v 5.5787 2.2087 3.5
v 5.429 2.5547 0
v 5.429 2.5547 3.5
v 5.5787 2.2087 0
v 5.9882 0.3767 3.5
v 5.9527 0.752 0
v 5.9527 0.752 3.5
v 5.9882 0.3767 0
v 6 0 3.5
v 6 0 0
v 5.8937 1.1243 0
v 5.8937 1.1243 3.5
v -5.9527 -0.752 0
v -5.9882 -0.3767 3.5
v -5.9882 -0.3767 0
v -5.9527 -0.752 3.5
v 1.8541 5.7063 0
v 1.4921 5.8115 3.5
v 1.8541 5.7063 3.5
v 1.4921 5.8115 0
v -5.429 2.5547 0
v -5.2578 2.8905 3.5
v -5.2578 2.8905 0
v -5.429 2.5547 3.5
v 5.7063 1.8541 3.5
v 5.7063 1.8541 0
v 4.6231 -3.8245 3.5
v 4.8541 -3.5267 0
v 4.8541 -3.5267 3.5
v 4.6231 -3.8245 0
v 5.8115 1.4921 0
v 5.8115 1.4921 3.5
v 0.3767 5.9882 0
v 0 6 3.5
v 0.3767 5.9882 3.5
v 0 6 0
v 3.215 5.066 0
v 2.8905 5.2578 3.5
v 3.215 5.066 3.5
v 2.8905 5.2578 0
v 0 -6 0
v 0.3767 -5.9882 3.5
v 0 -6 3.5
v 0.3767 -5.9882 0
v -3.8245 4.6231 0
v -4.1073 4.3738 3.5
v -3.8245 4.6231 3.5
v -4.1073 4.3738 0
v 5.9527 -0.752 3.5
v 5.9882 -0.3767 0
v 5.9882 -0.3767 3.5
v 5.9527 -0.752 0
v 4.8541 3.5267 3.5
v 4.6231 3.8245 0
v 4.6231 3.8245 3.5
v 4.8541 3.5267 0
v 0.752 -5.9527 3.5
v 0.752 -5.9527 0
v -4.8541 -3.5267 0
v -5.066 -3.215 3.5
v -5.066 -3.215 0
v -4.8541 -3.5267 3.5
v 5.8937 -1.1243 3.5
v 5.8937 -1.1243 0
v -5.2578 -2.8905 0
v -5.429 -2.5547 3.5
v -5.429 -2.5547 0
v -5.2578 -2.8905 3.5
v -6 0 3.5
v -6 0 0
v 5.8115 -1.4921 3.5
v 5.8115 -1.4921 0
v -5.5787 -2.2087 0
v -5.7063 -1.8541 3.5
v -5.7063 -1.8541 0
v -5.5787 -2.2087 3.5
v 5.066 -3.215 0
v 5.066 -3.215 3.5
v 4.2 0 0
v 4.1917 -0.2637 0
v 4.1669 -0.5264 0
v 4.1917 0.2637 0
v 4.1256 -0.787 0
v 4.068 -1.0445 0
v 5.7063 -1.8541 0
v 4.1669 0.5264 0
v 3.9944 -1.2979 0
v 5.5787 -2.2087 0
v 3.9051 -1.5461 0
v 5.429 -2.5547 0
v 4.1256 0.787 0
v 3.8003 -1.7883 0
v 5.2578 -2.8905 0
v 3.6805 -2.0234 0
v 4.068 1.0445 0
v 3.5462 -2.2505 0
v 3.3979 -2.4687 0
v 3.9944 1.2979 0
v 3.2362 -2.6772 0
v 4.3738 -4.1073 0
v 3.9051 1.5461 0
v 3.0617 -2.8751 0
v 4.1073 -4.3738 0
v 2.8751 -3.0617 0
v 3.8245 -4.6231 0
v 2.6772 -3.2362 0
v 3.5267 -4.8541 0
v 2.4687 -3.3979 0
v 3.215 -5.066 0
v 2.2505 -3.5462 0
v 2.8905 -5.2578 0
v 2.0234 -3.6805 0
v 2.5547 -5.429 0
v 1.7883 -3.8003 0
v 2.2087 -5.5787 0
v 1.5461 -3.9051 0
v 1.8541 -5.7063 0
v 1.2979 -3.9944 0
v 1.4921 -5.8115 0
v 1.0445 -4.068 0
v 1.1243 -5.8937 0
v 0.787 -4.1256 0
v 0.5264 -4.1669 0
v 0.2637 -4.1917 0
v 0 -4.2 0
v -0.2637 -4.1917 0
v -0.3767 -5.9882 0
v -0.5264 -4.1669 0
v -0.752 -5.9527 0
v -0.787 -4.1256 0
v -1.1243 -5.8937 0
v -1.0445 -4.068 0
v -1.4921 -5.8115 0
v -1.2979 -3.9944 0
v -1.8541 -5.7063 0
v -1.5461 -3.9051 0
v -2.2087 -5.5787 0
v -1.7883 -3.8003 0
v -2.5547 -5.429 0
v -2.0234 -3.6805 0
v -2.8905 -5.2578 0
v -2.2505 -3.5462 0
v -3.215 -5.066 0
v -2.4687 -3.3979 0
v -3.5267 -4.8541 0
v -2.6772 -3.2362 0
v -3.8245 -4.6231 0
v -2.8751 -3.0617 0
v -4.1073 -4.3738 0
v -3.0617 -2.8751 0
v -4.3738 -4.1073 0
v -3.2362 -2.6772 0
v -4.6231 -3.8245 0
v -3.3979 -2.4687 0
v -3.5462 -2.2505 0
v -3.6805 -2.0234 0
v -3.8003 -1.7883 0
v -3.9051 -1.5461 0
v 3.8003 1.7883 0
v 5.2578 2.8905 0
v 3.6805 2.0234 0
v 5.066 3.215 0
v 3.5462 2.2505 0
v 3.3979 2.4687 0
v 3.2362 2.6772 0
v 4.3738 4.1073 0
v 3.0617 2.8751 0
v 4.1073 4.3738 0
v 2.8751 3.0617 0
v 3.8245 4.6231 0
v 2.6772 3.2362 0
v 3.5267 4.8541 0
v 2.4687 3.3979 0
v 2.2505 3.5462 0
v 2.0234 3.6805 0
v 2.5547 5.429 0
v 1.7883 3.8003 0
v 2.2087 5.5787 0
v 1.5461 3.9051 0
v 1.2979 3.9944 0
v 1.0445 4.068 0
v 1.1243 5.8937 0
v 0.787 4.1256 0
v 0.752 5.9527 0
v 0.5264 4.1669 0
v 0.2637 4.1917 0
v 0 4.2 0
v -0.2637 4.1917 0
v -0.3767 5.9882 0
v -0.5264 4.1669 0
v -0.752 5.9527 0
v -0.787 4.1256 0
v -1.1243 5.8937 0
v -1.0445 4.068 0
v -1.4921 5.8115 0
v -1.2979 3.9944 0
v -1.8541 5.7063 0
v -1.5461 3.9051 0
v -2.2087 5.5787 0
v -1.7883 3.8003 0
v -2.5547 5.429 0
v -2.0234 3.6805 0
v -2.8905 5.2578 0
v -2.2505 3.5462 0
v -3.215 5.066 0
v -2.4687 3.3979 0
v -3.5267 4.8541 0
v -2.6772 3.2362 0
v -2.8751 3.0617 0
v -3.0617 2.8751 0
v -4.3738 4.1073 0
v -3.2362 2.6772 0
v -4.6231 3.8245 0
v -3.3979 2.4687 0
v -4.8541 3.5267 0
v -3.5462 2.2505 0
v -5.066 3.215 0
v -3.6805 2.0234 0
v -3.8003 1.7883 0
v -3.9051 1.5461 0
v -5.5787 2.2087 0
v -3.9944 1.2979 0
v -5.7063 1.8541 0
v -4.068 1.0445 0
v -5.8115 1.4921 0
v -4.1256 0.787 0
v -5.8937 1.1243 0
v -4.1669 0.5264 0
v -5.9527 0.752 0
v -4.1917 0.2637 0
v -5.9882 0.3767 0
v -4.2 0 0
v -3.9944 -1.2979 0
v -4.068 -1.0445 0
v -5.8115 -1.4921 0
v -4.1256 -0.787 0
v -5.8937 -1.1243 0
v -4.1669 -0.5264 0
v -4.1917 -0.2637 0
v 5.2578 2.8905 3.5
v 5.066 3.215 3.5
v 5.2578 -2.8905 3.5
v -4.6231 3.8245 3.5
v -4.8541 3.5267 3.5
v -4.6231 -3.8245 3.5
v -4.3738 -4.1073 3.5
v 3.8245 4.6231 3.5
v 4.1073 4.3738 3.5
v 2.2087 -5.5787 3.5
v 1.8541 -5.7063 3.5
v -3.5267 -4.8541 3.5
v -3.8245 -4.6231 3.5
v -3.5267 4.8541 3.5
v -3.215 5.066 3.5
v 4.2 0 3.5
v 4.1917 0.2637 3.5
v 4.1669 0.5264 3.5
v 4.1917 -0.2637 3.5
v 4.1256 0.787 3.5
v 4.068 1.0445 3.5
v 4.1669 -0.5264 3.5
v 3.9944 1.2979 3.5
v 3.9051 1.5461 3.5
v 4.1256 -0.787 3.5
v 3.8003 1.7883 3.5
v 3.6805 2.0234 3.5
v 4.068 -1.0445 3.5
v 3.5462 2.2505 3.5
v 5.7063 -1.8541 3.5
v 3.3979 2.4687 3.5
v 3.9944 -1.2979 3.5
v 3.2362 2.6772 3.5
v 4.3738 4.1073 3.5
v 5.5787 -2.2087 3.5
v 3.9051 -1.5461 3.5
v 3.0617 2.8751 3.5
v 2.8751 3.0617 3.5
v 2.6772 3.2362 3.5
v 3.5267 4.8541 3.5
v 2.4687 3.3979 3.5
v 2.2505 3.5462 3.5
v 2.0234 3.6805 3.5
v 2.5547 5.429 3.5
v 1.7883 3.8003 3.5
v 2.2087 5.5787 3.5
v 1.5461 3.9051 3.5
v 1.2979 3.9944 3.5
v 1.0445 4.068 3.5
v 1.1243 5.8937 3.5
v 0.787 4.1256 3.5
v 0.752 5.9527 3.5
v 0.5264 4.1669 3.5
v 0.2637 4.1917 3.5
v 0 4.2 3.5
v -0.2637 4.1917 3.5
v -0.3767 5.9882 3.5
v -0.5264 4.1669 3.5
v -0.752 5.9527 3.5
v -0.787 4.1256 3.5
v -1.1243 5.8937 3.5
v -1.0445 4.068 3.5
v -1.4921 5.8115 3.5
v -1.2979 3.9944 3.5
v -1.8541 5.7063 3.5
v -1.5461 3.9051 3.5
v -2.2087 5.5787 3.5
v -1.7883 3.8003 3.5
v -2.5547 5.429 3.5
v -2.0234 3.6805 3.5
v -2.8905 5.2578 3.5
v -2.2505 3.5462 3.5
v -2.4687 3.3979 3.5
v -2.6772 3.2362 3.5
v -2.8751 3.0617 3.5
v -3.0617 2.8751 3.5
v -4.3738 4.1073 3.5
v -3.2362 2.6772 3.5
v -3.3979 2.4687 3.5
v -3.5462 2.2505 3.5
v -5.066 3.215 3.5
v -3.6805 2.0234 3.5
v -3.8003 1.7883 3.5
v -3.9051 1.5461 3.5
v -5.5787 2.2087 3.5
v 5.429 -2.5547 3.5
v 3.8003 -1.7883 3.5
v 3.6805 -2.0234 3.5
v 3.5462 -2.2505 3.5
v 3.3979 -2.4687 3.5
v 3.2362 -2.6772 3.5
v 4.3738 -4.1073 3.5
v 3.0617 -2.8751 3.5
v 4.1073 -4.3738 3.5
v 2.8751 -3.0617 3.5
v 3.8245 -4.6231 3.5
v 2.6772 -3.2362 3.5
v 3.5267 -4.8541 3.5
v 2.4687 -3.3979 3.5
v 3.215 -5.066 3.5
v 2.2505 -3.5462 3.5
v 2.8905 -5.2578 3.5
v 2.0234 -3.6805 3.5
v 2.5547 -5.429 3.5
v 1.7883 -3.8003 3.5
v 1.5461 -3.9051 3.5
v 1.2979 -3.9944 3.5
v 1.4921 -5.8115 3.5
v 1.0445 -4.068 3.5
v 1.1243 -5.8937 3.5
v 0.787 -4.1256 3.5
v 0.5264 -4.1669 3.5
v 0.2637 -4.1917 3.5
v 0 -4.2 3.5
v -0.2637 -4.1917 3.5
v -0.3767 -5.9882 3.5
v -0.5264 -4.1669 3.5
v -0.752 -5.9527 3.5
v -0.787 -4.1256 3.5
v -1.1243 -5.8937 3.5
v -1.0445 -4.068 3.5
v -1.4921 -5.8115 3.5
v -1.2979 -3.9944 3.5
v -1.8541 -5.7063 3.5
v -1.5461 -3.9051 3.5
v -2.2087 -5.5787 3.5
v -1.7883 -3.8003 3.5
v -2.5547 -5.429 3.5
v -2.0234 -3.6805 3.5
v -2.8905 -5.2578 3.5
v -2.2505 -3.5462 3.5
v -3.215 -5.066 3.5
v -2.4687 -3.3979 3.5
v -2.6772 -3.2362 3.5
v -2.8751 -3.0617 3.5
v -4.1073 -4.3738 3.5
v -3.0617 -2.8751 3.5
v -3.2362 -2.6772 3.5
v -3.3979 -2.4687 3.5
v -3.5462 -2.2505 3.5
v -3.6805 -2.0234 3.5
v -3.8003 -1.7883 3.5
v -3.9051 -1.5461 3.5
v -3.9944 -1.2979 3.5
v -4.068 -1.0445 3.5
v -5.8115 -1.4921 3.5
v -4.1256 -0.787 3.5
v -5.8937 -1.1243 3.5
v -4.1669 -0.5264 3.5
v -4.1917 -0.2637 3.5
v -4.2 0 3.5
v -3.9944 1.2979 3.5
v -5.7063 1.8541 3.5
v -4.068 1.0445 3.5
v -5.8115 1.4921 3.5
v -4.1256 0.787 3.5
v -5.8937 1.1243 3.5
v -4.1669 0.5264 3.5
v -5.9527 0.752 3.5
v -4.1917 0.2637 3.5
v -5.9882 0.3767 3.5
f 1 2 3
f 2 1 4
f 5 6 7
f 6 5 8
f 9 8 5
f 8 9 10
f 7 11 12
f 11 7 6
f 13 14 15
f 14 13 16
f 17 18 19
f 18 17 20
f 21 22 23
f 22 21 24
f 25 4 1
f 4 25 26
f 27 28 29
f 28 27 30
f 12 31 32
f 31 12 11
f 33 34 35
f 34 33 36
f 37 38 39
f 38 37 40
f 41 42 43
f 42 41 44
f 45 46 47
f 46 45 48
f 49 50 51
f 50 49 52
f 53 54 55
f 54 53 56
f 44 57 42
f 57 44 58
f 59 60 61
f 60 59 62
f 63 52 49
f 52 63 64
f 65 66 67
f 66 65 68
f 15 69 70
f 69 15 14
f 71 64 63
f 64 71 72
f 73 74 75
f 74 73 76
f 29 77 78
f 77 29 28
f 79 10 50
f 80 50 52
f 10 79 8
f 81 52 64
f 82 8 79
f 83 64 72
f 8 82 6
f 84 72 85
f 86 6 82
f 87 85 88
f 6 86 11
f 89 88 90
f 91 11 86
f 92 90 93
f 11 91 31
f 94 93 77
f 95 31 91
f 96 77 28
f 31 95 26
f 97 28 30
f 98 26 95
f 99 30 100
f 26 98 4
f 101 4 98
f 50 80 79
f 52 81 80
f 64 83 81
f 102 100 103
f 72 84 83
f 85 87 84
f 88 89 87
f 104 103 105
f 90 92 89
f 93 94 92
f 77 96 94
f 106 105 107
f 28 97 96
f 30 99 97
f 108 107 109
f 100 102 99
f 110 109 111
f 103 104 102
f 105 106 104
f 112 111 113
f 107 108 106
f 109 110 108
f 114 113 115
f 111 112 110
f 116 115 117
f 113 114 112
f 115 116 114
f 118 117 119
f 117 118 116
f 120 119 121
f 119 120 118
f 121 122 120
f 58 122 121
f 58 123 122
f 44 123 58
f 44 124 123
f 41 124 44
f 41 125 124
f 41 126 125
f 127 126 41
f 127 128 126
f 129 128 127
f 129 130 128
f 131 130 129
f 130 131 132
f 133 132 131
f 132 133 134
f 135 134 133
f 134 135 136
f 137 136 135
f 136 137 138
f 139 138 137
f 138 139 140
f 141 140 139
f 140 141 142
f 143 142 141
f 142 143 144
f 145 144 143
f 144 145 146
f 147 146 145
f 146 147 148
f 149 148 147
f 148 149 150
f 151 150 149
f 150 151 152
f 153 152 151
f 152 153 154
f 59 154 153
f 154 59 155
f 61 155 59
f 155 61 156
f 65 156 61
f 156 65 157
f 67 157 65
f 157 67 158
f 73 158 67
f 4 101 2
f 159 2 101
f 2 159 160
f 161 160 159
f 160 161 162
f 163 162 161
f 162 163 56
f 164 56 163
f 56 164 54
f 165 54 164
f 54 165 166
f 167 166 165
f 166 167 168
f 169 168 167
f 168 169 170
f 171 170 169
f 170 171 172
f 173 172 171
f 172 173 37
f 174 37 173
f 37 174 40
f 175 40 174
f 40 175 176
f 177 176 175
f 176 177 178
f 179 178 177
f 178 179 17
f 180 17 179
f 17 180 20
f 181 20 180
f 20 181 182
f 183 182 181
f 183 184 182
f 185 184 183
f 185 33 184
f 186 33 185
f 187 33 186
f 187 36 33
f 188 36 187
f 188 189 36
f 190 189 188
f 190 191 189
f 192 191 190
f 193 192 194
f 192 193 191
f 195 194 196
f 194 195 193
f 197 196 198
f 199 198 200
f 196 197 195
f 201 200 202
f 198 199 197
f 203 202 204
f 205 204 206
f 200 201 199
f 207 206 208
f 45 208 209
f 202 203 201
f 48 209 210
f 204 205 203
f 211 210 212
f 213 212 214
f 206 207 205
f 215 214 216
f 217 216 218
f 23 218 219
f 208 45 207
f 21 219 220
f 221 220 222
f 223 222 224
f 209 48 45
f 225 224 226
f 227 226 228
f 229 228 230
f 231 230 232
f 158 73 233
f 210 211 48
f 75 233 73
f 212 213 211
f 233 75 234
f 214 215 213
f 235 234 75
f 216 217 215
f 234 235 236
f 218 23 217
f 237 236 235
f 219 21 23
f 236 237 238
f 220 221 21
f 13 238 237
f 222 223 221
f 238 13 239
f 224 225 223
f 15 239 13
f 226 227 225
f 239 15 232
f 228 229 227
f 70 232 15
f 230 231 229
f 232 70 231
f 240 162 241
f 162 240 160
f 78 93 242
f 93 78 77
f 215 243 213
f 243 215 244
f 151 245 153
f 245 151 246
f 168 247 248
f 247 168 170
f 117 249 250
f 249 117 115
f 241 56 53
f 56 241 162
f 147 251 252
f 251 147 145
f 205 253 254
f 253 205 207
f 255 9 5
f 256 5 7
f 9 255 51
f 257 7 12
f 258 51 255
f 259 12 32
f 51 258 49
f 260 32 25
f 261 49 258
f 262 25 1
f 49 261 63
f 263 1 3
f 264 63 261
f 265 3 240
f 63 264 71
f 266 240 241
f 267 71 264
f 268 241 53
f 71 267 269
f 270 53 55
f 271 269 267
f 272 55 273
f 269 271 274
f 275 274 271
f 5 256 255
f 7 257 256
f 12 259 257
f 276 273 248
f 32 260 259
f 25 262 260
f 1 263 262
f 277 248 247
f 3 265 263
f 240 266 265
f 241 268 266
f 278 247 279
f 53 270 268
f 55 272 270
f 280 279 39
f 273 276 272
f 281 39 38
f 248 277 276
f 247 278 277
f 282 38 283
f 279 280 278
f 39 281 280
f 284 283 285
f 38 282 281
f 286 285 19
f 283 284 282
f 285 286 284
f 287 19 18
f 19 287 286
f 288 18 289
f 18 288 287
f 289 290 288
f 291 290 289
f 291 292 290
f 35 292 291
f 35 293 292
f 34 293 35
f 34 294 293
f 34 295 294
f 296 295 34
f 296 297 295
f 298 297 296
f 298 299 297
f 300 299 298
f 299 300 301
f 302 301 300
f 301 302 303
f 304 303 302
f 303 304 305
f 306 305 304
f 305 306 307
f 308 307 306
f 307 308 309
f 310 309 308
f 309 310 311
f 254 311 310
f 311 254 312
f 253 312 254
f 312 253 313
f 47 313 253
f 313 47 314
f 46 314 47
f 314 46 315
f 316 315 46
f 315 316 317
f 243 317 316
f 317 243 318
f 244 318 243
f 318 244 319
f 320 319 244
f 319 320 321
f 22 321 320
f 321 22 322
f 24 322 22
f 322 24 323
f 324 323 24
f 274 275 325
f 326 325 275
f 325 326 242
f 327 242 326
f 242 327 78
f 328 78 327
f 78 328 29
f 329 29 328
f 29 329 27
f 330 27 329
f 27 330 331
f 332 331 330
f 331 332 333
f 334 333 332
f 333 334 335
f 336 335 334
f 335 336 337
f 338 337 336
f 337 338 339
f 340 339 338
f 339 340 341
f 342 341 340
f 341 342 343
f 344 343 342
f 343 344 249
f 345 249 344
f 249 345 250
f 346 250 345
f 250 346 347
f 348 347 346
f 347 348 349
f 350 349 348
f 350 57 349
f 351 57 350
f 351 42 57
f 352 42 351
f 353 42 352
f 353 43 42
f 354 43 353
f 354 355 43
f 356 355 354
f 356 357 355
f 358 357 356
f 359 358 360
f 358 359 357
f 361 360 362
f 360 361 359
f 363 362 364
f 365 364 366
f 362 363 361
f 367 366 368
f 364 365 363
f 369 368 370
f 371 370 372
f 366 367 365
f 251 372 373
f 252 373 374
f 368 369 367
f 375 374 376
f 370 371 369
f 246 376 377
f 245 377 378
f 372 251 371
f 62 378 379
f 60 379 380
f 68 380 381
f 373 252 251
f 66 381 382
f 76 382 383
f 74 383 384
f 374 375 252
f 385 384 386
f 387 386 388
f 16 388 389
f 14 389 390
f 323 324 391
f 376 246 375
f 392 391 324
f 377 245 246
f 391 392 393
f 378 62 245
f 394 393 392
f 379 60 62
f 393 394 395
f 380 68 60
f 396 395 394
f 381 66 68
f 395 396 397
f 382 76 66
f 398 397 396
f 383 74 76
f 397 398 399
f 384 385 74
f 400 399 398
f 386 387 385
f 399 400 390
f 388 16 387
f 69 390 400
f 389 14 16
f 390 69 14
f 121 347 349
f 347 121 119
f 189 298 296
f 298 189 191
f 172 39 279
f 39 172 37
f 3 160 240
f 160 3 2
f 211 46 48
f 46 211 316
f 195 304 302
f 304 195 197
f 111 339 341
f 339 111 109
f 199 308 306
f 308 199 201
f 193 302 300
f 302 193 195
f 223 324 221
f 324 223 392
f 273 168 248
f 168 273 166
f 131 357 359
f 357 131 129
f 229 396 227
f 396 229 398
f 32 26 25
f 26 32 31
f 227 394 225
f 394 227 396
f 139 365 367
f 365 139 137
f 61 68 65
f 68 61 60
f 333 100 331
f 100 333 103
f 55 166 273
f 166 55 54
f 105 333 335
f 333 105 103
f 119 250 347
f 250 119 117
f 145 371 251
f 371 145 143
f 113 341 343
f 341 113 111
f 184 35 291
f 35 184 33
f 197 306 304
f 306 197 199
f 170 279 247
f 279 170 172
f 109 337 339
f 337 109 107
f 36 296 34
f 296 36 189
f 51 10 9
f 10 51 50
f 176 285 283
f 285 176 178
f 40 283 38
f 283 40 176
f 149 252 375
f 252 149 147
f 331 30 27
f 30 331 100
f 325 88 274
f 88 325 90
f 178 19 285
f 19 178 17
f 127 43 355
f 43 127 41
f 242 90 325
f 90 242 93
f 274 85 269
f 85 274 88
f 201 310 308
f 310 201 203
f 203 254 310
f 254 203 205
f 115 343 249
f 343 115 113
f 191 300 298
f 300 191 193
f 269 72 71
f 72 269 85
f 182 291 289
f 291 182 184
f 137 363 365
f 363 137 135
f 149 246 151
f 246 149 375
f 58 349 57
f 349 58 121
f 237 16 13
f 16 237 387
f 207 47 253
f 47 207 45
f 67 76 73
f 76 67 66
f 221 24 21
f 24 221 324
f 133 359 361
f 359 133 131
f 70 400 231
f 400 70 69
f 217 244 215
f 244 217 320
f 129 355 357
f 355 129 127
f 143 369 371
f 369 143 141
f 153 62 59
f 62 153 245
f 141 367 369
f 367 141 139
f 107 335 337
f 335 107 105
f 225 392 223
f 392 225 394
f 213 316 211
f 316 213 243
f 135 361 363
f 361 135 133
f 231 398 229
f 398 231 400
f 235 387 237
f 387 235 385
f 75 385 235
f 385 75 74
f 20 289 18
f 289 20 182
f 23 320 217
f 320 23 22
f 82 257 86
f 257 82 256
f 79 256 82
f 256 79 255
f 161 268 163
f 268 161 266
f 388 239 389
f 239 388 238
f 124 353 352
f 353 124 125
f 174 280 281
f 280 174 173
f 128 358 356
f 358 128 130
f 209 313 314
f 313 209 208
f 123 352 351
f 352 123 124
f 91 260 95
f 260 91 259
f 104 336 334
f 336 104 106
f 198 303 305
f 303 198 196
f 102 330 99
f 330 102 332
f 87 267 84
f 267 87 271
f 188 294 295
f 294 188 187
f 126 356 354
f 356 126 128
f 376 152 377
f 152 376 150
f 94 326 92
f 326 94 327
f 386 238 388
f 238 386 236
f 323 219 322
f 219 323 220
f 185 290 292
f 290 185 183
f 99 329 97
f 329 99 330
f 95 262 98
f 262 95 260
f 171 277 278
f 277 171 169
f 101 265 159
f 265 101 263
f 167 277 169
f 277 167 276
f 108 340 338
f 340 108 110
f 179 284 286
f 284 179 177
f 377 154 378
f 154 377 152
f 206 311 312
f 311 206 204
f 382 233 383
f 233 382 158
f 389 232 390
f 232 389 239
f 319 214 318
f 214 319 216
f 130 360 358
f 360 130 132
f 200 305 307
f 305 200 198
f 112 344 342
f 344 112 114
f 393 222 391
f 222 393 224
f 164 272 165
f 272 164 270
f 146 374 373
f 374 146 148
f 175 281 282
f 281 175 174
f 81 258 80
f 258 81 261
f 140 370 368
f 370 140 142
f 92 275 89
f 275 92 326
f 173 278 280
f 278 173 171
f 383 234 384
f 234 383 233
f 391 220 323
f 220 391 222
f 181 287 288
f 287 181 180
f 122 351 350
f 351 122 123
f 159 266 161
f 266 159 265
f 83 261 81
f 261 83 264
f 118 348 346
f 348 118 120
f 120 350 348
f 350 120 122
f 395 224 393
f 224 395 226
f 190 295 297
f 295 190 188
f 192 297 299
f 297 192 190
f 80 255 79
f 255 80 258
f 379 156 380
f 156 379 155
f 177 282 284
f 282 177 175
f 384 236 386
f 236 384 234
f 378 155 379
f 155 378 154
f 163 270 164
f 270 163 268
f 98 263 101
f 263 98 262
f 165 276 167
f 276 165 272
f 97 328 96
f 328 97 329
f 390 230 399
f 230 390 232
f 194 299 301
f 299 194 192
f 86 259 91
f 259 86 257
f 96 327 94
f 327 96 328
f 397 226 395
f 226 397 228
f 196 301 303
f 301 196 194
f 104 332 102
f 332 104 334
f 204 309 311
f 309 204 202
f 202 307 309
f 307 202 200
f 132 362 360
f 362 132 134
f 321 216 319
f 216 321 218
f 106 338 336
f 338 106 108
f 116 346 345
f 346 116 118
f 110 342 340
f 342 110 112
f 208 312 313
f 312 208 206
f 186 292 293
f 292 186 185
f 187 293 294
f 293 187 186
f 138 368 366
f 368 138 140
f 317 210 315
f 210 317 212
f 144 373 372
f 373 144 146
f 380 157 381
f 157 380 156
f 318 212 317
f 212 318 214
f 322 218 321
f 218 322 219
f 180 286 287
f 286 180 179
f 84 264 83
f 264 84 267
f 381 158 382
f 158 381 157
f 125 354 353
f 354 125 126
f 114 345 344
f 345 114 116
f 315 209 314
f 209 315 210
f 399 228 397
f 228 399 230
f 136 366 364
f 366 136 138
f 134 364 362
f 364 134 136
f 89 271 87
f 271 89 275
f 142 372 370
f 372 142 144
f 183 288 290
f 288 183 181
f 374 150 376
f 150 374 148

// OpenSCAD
module fake_bear(diam_ext,diam_int,alt){
difference(){
    cylinder(r=diam_ext/2, h=alt,$fn=100);
    translate([0,0,-1])
        cylinder(r=diam_int/2, h=alt+2,$fn=100);
}
}

//Adelante (Chico)
fake_bear(12,8.4,3.5);

//Atras (Grande)
//fake_bear(18,,4);
